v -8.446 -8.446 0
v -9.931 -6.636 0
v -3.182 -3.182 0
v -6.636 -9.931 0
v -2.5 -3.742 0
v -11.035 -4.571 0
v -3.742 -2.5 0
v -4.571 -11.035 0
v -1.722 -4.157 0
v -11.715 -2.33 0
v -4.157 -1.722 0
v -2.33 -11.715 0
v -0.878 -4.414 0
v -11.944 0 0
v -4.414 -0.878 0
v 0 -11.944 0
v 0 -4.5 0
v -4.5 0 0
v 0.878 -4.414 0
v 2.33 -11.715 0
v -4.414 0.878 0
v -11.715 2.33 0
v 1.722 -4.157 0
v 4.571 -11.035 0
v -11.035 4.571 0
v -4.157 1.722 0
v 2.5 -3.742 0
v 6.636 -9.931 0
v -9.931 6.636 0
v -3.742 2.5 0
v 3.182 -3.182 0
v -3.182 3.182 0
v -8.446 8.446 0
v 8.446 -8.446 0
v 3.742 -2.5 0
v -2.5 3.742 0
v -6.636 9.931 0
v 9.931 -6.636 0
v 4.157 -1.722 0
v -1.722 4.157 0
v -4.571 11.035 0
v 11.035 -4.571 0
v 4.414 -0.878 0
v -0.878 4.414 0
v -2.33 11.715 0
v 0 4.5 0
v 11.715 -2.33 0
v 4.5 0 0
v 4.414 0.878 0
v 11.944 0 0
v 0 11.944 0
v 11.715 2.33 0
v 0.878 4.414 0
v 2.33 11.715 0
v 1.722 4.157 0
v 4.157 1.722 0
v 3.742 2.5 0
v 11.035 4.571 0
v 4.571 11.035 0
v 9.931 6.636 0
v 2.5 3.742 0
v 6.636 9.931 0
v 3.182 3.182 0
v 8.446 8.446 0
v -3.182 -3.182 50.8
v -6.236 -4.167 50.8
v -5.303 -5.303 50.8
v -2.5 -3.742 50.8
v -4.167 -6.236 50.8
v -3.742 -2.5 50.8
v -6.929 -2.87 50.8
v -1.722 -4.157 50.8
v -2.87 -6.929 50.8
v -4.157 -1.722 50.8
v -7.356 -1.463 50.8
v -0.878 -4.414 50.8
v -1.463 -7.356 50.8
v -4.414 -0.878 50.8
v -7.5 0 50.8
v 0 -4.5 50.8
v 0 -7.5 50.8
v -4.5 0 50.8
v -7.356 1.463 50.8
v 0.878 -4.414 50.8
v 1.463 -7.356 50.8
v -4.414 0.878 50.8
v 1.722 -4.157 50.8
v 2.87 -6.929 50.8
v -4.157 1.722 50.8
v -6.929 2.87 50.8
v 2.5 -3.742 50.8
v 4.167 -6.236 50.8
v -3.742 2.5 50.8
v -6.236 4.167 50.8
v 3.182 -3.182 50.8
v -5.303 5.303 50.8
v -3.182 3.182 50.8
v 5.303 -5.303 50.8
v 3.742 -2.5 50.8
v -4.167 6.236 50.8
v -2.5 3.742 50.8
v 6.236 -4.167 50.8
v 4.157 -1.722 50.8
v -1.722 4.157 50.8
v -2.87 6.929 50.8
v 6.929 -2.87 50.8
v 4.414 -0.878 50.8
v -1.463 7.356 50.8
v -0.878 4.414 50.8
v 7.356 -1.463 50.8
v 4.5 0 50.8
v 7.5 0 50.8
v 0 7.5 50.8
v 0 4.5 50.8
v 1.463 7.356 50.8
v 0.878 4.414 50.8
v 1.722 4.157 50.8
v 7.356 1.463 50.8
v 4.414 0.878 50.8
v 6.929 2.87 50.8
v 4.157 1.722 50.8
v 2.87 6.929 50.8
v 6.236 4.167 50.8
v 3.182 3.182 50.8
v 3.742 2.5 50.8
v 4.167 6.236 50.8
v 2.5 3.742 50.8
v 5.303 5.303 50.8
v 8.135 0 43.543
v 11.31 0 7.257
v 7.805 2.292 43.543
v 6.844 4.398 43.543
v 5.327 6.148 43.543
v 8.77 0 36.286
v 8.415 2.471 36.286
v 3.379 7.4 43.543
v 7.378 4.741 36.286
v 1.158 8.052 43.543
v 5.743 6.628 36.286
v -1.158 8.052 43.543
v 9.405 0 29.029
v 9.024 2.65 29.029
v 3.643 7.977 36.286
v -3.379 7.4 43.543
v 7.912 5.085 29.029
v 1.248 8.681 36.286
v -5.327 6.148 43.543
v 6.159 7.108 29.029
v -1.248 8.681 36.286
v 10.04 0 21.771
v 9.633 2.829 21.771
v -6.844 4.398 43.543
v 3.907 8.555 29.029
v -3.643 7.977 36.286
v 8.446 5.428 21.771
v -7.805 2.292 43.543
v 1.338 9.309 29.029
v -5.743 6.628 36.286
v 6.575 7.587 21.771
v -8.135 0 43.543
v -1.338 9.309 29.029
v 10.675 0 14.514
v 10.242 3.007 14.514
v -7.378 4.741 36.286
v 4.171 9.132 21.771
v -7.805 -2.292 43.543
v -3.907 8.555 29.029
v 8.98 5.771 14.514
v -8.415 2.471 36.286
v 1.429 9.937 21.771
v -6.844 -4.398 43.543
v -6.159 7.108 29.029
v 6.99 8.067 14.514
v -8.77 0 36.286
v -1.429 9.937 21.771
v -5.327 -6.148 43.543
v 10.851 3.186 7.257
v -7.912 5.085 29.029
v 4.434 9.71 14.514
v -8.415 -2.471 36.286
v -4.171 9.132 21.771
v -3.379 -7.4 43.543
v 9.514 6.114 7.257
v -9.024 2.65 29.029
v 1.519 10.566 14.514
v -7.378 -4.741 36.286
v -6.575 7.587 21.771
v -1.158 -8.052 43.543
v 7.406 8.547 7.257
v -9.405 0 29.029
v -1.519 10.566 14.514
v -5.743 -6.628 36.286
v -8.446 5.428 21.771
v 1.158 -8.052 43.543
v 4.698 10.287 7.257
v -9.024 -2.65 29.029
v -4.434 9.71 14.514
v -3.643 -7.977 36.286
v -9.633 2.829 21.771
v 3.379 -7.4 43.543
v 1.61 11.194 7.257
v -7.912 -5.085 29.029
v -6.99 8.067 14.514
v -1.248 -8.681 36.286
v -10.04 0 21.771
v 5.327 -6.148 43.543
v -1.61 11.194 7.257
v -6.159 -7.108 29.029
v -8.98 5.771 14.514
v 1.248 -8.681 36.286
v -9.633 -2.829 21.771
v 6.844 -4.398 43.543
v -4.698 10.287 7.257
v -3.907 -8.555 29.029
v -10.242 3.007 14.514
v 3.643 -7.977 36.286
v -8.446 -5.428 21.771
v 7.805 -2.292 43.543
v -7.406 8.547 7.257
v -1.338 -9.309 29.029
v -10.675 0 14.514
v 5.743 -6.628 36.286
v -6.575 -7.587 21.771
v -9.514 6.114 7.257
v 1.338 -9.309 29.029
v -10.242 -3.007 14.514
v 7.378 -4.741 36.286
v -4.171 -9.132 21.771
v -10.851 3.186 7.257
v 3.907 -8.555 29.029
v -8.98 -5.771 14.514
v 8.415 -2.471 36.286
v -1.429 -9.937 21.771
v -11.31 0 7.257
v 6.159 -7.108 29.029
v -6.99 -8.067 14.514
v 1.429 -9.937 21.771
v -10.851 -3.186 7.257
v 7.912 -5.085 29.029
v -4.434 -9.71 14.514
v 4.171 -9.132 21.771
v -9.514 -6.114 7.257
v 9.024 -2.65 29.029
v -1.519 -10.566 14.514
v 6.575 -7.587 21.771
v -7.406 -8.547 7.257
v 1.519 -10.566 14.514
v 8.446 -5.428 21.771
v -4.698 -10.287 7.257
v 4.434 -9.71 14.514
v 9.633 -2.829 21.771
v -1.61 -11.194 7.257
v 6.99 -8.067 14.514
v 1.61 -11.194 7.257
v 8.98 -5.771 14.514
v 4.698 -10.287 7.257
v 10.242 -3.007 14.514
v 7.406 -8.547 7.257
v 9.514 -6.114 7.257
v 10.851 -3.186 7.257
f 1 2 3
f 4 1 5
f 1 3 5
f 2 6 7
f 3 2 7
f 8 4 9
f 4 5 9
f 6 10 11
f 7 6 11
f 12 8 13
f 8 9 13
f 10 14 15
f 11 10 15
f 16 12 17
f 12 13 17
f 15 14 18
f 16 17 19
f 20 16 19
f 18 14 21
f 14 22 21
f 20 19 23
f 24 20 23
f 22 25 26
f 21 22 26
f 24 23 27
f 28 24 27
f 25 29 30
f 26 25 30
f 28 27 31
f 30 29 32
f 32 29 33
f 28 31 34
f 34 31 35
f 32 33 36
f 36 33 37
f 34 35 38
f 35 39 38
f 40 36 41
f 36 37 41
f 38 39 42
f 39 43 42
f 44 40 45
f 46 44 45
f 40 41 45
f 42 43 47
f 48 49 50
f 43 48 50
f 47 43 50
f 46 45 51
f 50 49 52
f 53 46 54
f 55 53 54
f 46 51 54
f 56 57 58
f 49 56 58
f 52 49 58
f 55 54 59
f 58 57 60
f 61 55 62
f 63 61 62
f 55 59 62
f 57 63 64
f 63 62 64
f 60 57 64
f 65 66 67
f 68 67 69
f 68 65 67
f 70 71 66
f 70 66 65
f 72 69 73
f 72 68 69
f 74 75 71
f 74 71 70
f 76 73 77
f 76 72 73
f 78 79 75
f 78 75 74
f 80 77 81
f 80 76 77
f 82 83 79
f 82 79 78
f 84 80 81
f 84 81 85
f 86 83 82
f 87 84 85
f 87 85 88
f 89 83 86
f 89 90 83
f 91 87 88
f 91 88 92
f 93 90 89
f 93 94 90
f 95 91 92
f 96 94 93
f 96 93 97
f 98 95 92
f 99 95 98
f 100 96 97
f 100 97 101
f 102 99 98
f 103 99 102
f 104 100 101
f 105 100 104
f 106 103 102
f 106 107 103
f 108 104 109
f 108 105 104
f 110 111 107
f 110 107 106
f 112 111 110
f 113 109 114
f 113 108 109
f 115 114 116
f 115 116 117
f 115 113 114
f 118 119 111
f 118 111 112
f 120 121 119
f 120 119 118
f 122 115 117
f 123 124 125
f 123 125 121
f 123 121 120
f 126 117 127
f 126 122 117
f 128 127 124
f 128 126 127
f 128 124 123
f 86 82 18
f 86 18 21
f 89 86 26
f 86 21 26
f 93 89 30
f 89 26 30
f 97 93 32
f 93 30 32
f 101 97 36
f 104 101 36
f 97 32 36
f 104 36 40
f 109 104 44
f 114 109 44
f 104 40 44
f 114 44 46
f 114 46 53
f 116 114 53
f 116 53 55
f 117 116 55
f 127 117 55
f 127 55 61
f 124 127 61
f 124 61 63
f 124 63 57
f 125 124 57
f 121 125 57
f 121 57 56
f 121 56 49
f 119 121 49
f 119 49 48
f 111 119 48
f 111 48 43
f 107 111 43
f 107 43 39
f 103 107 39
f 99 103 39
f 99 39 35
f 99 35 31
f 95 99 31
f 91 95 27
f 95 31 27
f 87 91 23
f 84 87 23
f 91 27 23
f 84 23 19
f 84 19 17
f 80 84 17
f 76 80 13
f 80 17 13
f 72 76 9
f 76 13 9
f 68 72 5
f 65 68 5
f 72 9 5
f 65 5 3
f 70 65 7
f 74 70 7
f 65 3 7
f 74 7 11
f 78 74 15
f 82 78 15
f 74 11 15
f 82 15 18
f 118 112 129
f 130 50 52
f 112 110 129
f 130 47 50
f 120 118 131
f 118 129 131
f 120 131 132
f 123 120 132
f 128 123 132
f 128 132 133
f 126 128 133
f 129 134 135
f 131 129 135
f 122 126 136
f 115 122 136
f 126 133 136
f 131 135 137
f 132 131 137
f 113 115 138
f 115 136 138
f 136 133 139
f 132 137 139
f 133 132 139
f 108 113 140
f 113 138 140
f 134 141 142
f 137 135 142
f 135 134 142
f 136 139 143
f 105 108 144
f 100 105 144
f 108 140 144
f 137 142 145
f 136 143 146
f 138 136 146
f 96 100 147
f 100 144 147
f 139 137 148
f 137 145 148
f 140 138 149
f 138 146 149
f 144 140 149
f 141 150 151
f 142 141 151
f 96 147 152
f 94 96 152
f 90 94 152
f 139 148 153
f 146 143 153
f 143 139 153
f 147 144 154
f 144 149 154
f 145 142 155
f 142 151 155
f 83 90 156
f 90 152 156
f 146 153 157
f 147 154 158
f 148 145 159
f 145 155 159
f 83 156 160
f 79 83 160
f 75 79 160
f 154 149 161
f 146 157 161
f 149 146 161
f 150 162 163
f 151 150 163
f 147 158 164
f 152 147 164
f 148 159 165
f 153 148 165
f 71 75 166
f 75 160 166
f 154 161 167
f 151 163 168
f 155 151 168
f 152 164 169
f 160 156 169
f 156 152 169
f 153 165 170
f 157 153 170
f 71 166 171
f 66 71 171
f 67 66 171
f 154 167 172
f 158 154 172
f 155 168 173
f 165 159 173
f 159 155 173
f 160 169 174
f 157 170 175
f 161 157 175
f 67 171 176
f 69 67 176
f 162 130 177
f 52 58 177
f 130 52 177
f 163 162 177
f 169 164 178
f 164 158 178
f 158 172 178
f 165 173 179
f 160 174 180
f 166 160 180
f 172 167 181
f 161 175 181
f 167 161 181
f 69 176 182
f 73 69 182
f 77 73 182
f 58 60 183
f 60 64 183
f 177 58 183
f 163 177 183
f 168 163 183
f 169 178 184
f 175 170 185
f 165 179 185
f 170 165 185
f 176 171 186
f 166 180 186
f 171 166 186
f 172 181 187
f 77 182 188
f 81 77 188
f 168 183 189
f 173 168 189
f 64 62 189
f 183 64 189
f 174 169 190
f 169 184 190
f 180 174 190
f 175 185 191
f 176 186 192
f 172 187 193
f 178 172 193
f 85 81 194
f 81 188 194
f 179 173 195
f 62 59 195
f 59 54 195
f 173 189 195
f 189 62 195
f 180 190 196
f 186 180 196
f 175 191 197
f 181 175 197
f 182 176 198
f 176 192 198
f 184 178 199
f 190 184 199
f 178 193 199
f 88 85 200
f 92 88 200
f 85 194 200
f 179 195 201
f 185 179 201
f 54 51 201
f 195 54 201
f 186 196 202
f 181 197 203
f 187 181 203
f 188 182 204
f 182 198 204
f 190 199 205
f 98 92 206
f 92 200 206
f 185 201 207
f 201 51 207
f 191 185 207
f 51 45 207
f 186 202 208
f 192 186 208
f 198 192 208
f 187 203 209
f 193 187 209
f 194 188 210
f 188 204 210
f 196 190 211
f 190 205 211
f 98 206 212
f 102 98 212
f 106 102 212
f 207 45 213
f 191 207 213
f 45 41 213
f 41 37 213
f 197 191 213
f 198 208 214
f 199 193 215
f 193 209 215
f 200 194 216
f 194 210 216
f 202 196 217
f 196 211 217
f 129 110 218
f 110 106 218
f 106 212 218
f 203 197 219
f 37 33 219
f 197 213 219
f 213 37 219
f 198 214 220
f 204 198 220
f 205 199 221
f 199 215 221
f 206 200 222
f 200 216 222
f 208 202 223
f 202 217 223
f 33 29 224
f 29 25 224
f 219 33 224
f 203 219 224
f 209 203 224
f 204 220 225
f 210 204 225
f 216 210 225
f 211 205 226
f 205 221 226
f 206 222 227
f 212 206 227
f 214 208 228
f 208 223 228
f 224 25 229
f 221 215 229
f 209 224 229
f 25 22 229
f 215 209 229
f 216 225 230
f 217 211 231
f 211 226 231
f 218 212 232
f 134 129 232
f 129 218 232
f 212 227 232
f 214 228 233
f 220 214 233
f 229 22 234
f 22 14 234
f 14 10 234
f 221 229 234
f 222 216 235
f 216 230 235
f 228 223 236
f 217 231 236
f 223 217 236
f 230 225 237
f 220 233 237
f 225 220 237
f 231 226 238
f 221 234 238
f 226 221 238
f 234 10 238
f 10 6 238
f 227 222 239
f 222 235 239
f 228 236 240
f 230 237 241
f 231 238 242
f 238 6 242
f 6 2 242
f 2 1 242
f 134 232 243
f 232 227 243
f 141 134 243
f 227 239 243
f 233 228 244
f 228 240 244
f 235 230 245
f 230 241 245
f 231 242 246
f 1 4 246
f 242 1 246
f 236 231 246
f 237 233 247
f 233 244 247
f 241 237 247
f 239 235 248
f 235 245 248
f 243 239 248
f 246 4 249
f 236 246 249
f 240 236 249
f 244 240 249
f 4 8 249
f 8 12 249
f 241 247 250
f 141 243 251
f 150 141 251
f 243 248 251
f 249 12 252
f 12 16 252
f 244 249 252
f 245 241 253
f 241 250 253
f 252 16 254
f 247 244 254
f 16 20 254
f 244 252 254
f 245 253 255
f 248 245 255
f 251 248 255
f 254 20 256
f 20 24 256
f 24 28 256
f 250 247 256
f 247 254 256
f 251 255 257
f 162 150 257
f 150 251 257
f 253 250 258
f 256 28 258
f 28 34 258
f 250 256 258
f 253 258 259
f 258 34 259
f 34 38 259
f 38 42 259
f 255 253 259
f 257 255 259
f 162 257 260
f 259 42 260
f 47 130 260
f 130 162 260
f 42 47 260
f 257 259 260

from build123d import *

# Parameters (mm, degrees)
SKETCH1_R          = 7.5
BOSS_EXTRUDE_DEPTH = 50.8
DRAFT3_ANGLE       = 5
SKETCH2_R          = 4.5
CUT_EXTRUDE1_DEPTH = 54.534834776


with BuildPart() as part:
    # Sketch1 → Boss-Extrude (new body)
    with BuildSketch(Plane.XY):
        Circle(SKETCH1_R)
    extrude(amount=BOSS_EXTRUDE_DEPTH)

    # Draft3
    draft3_faces = [part.faces().sort_by_distance(p)[0] for p in [
        (-7.5, 0, 25.4),
    ]]
    draft(draft3_faces, Plane.XY.offset(50.8), DRAFT3_ANGLE)

    # Sketch2 → Cut-Extrude1 (cut, through all)
    with BuildSketch(Plane(origin=(0, 0, 0), x_dir=(-1, 0, 0), z_dir=(0, 0, -1))):
        Circle(SKETCH2_R)
    extrude(amount=-CUT_EXTRUDE1_DEPTH, mode=Mode.SUBTRACT)


solid = part.part
